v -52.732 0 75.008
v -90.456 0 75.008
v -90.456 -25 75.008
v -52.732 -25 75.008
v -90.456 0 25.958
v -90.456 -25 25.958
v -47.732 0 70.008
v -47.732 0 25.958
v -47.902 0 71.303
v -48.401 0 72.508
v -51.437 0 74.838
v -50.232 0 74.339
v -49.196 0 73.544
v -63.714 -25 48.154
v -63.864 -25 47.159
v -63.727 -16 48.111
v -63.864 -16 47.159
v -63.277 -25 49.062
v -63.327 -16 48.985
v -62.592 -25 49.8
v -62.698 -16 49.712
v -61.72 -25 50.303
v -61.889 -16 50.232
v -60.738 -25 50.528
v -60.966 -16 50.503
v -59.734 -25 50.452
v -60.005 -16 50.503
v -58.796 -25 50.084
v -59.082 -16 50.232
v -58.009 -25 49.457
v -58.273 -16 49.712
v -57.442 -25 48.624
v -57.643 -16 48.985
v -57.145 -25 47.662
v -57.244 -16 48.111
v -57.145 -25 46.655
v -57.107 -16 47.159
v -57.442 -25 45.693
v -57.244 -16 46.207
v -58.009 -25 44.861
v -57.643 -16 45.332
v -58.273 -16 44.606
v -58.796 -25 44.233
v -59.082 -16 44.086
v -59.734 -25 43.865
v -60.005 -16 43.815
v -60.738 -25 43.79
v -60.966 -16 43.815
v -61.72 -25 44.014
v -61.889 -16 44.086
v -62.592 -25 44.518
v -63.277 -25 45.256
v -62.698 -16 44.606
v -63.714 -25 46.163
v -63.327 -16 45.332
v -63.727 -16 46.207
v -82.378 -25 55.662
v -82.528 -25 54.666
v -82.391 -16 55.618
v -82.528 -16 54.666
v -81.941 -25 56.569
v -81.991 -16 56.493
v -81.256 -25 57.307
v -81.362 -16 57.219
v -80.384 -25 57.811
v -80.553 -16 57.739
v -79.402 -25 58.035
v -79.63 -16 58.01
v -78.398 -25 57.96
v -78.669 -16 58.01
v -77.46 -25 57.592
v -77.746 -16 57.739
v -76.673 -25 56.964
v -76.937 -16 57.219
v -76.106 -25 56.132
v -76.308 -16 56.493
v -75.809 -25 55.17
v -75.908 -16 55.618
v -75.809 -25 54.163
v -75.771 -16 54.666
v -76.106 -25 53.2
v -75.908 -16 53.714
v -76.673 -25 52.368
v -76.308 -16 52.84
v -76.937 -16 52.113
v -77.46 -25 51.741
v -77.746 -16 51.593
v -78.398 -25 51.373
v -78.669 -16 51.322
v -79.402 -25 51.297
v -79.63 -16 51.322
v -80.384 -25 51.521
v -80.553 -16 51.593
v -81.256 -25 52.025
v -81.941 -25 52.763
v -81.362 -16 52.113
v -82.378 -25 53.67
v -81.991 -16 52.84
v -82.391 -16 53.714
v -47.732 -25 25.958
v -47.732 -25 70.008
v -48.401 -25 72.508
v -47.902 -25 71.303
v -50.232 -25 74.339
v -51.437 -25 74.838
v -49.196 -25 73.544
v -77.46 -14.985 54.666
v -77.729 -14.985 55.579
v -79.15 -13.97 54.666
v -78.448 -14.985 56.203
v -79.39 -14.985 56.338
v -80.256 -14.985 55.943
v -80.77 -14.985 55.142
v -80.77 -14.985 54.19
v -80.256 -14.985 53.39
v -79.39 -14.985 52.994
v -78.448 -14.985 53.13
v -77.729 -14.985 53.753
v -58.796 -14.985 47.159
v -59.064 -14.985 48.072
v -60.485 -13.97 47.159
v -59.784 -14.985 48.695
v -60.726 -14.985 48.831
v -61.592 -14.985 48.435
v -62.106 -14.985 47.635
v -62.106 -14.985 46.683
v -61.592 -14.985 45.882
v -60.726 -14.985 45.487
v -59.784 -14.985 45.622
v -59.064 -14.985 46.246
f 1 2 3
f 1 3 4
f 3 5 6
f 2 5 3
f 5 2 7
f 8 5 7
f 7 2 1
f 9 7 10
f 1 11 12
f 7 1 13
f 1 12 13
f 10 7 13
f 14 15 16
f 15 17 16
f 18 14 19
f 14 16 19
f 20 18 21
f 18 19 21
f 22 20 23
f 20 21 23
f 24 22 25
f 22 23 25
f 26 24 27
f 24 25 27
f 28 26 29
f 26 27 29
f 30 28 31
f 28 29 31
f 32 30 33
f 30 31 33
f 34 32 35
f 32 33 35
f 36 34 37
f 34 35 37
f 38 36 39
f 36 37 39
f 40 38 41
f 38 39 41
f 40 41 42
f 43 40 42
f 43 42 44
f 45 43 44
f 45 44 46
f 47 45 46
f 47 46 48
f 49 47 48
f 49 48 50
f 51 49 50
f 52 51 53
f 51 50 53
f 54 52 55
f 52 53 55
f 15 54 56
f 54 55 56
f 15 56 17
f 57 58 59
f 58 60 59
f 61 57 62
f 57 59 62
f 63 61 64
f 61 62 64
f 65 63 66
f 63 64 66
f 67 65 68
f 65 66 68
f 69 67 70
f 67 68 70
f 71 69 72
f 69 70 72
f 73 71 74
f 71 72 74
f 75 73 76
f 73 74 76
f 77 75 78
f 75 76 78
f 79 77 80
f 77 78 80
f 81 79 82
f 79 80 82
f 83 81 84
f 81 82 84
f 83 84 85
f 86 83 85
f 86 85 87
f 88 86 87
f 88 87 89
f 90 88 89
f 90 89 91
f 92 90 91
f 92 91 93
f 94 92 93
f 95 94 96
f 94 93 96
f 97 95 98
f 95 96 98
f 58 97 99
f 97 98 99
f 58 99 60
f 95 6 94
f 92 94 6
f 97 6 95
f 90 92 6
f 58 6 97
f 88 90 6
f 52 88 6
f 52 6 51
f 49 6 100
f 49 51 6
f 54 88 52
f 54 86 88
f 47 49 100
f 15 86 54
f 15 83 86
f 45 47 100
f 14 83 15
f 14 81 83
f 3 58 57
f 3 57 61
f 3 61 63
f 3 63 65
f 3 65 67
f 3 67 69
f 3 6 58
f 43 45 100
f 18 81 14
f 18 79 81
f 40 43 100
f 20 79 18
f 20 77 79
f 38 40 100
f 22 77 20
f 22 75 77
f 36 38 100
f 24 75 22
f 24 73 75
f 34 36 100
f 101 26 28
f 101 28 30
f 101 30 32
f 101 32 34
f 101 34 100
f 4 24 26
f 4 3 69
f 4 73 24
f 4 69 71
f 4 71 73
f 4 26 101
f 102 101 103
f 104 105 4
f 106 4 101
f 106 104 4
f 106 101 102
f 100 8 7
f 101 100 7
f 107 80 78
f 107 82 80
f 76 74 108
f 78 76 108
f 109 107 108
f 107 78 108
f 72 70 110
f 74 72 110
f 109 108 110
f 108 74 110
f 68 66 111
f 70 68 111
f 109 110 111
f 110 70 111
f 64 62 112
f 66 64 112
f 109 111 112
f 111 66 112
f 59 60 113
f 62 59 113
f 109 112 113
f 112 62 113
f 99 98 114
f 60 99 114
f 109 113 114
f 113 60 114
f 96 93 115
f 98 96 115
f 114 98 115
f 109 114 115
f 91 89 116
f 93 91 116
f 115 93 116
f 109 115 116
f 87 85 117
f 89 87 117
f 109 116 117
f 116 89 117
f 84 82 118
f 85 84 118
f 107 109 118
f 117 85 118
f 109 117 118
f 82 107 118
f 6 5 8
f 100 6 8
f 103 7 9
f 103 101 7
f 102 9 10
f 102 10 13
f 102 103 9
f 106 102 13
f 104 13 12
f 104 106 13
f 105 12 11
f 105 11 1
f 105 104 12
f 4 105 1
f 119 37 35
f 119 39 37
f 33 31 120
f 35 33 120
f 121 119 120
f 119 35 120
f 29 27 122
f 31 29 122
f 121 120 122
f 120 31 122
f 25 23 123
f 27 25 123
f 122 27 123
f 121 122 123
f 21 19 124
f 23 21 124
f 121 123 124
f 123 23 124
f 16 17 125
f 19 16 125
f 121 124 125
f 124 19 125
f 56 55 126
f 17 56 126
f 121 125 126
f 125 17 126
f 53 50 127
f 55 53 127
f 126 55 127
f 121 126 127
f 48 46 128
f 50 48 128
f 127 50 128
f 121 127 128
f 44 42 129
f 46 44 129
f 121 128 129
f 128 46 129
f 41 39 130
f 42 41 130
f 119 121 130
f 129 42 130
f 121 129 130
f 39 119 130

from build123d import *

# Parameters (mm, degrees)
F0_W     = 42.7247285843
F0_H     = 49.0501485765
F1_DEPTH = 25
F2_R     = 5
F4_D     = 6.7564
F4_DEPTH = 9
F4_TIP   = 2.0298273432


with BuildPart() as f1:
    # F0 (on Front) → F1 (new body)
    with BuildSketch(Plane.XZ):
        with Locations((-69.0939426422, 50.483379513)):
            Rectangle(F0_W, F0_H)
    extrude(amount=F1_DEPTH)

    # F2
    f2_edges = [f1.edges().sort_by_distance(p)[0] for p in [
        (-47.731578, -12.5, 75.008454),
    ]]
    fillet(f2_edges, radius=F2_R)

    # F4
    with Locations(Plane.XZ.offset(25)):
        with Locations((-79.1495665908, 54.6661131084), (-60.4854077101, 47.1587516367)):
            Hole(F4_D / 2, depth=F4_DEPTH)
            with Locations((0, 0, -(F4_DEPTH + F4_TIP / 2))):  # 118° drill point
                Cone(0, F4_D / 2, F4_TIP, mode=Mode.SUBTRACT)


solid = f1.part
